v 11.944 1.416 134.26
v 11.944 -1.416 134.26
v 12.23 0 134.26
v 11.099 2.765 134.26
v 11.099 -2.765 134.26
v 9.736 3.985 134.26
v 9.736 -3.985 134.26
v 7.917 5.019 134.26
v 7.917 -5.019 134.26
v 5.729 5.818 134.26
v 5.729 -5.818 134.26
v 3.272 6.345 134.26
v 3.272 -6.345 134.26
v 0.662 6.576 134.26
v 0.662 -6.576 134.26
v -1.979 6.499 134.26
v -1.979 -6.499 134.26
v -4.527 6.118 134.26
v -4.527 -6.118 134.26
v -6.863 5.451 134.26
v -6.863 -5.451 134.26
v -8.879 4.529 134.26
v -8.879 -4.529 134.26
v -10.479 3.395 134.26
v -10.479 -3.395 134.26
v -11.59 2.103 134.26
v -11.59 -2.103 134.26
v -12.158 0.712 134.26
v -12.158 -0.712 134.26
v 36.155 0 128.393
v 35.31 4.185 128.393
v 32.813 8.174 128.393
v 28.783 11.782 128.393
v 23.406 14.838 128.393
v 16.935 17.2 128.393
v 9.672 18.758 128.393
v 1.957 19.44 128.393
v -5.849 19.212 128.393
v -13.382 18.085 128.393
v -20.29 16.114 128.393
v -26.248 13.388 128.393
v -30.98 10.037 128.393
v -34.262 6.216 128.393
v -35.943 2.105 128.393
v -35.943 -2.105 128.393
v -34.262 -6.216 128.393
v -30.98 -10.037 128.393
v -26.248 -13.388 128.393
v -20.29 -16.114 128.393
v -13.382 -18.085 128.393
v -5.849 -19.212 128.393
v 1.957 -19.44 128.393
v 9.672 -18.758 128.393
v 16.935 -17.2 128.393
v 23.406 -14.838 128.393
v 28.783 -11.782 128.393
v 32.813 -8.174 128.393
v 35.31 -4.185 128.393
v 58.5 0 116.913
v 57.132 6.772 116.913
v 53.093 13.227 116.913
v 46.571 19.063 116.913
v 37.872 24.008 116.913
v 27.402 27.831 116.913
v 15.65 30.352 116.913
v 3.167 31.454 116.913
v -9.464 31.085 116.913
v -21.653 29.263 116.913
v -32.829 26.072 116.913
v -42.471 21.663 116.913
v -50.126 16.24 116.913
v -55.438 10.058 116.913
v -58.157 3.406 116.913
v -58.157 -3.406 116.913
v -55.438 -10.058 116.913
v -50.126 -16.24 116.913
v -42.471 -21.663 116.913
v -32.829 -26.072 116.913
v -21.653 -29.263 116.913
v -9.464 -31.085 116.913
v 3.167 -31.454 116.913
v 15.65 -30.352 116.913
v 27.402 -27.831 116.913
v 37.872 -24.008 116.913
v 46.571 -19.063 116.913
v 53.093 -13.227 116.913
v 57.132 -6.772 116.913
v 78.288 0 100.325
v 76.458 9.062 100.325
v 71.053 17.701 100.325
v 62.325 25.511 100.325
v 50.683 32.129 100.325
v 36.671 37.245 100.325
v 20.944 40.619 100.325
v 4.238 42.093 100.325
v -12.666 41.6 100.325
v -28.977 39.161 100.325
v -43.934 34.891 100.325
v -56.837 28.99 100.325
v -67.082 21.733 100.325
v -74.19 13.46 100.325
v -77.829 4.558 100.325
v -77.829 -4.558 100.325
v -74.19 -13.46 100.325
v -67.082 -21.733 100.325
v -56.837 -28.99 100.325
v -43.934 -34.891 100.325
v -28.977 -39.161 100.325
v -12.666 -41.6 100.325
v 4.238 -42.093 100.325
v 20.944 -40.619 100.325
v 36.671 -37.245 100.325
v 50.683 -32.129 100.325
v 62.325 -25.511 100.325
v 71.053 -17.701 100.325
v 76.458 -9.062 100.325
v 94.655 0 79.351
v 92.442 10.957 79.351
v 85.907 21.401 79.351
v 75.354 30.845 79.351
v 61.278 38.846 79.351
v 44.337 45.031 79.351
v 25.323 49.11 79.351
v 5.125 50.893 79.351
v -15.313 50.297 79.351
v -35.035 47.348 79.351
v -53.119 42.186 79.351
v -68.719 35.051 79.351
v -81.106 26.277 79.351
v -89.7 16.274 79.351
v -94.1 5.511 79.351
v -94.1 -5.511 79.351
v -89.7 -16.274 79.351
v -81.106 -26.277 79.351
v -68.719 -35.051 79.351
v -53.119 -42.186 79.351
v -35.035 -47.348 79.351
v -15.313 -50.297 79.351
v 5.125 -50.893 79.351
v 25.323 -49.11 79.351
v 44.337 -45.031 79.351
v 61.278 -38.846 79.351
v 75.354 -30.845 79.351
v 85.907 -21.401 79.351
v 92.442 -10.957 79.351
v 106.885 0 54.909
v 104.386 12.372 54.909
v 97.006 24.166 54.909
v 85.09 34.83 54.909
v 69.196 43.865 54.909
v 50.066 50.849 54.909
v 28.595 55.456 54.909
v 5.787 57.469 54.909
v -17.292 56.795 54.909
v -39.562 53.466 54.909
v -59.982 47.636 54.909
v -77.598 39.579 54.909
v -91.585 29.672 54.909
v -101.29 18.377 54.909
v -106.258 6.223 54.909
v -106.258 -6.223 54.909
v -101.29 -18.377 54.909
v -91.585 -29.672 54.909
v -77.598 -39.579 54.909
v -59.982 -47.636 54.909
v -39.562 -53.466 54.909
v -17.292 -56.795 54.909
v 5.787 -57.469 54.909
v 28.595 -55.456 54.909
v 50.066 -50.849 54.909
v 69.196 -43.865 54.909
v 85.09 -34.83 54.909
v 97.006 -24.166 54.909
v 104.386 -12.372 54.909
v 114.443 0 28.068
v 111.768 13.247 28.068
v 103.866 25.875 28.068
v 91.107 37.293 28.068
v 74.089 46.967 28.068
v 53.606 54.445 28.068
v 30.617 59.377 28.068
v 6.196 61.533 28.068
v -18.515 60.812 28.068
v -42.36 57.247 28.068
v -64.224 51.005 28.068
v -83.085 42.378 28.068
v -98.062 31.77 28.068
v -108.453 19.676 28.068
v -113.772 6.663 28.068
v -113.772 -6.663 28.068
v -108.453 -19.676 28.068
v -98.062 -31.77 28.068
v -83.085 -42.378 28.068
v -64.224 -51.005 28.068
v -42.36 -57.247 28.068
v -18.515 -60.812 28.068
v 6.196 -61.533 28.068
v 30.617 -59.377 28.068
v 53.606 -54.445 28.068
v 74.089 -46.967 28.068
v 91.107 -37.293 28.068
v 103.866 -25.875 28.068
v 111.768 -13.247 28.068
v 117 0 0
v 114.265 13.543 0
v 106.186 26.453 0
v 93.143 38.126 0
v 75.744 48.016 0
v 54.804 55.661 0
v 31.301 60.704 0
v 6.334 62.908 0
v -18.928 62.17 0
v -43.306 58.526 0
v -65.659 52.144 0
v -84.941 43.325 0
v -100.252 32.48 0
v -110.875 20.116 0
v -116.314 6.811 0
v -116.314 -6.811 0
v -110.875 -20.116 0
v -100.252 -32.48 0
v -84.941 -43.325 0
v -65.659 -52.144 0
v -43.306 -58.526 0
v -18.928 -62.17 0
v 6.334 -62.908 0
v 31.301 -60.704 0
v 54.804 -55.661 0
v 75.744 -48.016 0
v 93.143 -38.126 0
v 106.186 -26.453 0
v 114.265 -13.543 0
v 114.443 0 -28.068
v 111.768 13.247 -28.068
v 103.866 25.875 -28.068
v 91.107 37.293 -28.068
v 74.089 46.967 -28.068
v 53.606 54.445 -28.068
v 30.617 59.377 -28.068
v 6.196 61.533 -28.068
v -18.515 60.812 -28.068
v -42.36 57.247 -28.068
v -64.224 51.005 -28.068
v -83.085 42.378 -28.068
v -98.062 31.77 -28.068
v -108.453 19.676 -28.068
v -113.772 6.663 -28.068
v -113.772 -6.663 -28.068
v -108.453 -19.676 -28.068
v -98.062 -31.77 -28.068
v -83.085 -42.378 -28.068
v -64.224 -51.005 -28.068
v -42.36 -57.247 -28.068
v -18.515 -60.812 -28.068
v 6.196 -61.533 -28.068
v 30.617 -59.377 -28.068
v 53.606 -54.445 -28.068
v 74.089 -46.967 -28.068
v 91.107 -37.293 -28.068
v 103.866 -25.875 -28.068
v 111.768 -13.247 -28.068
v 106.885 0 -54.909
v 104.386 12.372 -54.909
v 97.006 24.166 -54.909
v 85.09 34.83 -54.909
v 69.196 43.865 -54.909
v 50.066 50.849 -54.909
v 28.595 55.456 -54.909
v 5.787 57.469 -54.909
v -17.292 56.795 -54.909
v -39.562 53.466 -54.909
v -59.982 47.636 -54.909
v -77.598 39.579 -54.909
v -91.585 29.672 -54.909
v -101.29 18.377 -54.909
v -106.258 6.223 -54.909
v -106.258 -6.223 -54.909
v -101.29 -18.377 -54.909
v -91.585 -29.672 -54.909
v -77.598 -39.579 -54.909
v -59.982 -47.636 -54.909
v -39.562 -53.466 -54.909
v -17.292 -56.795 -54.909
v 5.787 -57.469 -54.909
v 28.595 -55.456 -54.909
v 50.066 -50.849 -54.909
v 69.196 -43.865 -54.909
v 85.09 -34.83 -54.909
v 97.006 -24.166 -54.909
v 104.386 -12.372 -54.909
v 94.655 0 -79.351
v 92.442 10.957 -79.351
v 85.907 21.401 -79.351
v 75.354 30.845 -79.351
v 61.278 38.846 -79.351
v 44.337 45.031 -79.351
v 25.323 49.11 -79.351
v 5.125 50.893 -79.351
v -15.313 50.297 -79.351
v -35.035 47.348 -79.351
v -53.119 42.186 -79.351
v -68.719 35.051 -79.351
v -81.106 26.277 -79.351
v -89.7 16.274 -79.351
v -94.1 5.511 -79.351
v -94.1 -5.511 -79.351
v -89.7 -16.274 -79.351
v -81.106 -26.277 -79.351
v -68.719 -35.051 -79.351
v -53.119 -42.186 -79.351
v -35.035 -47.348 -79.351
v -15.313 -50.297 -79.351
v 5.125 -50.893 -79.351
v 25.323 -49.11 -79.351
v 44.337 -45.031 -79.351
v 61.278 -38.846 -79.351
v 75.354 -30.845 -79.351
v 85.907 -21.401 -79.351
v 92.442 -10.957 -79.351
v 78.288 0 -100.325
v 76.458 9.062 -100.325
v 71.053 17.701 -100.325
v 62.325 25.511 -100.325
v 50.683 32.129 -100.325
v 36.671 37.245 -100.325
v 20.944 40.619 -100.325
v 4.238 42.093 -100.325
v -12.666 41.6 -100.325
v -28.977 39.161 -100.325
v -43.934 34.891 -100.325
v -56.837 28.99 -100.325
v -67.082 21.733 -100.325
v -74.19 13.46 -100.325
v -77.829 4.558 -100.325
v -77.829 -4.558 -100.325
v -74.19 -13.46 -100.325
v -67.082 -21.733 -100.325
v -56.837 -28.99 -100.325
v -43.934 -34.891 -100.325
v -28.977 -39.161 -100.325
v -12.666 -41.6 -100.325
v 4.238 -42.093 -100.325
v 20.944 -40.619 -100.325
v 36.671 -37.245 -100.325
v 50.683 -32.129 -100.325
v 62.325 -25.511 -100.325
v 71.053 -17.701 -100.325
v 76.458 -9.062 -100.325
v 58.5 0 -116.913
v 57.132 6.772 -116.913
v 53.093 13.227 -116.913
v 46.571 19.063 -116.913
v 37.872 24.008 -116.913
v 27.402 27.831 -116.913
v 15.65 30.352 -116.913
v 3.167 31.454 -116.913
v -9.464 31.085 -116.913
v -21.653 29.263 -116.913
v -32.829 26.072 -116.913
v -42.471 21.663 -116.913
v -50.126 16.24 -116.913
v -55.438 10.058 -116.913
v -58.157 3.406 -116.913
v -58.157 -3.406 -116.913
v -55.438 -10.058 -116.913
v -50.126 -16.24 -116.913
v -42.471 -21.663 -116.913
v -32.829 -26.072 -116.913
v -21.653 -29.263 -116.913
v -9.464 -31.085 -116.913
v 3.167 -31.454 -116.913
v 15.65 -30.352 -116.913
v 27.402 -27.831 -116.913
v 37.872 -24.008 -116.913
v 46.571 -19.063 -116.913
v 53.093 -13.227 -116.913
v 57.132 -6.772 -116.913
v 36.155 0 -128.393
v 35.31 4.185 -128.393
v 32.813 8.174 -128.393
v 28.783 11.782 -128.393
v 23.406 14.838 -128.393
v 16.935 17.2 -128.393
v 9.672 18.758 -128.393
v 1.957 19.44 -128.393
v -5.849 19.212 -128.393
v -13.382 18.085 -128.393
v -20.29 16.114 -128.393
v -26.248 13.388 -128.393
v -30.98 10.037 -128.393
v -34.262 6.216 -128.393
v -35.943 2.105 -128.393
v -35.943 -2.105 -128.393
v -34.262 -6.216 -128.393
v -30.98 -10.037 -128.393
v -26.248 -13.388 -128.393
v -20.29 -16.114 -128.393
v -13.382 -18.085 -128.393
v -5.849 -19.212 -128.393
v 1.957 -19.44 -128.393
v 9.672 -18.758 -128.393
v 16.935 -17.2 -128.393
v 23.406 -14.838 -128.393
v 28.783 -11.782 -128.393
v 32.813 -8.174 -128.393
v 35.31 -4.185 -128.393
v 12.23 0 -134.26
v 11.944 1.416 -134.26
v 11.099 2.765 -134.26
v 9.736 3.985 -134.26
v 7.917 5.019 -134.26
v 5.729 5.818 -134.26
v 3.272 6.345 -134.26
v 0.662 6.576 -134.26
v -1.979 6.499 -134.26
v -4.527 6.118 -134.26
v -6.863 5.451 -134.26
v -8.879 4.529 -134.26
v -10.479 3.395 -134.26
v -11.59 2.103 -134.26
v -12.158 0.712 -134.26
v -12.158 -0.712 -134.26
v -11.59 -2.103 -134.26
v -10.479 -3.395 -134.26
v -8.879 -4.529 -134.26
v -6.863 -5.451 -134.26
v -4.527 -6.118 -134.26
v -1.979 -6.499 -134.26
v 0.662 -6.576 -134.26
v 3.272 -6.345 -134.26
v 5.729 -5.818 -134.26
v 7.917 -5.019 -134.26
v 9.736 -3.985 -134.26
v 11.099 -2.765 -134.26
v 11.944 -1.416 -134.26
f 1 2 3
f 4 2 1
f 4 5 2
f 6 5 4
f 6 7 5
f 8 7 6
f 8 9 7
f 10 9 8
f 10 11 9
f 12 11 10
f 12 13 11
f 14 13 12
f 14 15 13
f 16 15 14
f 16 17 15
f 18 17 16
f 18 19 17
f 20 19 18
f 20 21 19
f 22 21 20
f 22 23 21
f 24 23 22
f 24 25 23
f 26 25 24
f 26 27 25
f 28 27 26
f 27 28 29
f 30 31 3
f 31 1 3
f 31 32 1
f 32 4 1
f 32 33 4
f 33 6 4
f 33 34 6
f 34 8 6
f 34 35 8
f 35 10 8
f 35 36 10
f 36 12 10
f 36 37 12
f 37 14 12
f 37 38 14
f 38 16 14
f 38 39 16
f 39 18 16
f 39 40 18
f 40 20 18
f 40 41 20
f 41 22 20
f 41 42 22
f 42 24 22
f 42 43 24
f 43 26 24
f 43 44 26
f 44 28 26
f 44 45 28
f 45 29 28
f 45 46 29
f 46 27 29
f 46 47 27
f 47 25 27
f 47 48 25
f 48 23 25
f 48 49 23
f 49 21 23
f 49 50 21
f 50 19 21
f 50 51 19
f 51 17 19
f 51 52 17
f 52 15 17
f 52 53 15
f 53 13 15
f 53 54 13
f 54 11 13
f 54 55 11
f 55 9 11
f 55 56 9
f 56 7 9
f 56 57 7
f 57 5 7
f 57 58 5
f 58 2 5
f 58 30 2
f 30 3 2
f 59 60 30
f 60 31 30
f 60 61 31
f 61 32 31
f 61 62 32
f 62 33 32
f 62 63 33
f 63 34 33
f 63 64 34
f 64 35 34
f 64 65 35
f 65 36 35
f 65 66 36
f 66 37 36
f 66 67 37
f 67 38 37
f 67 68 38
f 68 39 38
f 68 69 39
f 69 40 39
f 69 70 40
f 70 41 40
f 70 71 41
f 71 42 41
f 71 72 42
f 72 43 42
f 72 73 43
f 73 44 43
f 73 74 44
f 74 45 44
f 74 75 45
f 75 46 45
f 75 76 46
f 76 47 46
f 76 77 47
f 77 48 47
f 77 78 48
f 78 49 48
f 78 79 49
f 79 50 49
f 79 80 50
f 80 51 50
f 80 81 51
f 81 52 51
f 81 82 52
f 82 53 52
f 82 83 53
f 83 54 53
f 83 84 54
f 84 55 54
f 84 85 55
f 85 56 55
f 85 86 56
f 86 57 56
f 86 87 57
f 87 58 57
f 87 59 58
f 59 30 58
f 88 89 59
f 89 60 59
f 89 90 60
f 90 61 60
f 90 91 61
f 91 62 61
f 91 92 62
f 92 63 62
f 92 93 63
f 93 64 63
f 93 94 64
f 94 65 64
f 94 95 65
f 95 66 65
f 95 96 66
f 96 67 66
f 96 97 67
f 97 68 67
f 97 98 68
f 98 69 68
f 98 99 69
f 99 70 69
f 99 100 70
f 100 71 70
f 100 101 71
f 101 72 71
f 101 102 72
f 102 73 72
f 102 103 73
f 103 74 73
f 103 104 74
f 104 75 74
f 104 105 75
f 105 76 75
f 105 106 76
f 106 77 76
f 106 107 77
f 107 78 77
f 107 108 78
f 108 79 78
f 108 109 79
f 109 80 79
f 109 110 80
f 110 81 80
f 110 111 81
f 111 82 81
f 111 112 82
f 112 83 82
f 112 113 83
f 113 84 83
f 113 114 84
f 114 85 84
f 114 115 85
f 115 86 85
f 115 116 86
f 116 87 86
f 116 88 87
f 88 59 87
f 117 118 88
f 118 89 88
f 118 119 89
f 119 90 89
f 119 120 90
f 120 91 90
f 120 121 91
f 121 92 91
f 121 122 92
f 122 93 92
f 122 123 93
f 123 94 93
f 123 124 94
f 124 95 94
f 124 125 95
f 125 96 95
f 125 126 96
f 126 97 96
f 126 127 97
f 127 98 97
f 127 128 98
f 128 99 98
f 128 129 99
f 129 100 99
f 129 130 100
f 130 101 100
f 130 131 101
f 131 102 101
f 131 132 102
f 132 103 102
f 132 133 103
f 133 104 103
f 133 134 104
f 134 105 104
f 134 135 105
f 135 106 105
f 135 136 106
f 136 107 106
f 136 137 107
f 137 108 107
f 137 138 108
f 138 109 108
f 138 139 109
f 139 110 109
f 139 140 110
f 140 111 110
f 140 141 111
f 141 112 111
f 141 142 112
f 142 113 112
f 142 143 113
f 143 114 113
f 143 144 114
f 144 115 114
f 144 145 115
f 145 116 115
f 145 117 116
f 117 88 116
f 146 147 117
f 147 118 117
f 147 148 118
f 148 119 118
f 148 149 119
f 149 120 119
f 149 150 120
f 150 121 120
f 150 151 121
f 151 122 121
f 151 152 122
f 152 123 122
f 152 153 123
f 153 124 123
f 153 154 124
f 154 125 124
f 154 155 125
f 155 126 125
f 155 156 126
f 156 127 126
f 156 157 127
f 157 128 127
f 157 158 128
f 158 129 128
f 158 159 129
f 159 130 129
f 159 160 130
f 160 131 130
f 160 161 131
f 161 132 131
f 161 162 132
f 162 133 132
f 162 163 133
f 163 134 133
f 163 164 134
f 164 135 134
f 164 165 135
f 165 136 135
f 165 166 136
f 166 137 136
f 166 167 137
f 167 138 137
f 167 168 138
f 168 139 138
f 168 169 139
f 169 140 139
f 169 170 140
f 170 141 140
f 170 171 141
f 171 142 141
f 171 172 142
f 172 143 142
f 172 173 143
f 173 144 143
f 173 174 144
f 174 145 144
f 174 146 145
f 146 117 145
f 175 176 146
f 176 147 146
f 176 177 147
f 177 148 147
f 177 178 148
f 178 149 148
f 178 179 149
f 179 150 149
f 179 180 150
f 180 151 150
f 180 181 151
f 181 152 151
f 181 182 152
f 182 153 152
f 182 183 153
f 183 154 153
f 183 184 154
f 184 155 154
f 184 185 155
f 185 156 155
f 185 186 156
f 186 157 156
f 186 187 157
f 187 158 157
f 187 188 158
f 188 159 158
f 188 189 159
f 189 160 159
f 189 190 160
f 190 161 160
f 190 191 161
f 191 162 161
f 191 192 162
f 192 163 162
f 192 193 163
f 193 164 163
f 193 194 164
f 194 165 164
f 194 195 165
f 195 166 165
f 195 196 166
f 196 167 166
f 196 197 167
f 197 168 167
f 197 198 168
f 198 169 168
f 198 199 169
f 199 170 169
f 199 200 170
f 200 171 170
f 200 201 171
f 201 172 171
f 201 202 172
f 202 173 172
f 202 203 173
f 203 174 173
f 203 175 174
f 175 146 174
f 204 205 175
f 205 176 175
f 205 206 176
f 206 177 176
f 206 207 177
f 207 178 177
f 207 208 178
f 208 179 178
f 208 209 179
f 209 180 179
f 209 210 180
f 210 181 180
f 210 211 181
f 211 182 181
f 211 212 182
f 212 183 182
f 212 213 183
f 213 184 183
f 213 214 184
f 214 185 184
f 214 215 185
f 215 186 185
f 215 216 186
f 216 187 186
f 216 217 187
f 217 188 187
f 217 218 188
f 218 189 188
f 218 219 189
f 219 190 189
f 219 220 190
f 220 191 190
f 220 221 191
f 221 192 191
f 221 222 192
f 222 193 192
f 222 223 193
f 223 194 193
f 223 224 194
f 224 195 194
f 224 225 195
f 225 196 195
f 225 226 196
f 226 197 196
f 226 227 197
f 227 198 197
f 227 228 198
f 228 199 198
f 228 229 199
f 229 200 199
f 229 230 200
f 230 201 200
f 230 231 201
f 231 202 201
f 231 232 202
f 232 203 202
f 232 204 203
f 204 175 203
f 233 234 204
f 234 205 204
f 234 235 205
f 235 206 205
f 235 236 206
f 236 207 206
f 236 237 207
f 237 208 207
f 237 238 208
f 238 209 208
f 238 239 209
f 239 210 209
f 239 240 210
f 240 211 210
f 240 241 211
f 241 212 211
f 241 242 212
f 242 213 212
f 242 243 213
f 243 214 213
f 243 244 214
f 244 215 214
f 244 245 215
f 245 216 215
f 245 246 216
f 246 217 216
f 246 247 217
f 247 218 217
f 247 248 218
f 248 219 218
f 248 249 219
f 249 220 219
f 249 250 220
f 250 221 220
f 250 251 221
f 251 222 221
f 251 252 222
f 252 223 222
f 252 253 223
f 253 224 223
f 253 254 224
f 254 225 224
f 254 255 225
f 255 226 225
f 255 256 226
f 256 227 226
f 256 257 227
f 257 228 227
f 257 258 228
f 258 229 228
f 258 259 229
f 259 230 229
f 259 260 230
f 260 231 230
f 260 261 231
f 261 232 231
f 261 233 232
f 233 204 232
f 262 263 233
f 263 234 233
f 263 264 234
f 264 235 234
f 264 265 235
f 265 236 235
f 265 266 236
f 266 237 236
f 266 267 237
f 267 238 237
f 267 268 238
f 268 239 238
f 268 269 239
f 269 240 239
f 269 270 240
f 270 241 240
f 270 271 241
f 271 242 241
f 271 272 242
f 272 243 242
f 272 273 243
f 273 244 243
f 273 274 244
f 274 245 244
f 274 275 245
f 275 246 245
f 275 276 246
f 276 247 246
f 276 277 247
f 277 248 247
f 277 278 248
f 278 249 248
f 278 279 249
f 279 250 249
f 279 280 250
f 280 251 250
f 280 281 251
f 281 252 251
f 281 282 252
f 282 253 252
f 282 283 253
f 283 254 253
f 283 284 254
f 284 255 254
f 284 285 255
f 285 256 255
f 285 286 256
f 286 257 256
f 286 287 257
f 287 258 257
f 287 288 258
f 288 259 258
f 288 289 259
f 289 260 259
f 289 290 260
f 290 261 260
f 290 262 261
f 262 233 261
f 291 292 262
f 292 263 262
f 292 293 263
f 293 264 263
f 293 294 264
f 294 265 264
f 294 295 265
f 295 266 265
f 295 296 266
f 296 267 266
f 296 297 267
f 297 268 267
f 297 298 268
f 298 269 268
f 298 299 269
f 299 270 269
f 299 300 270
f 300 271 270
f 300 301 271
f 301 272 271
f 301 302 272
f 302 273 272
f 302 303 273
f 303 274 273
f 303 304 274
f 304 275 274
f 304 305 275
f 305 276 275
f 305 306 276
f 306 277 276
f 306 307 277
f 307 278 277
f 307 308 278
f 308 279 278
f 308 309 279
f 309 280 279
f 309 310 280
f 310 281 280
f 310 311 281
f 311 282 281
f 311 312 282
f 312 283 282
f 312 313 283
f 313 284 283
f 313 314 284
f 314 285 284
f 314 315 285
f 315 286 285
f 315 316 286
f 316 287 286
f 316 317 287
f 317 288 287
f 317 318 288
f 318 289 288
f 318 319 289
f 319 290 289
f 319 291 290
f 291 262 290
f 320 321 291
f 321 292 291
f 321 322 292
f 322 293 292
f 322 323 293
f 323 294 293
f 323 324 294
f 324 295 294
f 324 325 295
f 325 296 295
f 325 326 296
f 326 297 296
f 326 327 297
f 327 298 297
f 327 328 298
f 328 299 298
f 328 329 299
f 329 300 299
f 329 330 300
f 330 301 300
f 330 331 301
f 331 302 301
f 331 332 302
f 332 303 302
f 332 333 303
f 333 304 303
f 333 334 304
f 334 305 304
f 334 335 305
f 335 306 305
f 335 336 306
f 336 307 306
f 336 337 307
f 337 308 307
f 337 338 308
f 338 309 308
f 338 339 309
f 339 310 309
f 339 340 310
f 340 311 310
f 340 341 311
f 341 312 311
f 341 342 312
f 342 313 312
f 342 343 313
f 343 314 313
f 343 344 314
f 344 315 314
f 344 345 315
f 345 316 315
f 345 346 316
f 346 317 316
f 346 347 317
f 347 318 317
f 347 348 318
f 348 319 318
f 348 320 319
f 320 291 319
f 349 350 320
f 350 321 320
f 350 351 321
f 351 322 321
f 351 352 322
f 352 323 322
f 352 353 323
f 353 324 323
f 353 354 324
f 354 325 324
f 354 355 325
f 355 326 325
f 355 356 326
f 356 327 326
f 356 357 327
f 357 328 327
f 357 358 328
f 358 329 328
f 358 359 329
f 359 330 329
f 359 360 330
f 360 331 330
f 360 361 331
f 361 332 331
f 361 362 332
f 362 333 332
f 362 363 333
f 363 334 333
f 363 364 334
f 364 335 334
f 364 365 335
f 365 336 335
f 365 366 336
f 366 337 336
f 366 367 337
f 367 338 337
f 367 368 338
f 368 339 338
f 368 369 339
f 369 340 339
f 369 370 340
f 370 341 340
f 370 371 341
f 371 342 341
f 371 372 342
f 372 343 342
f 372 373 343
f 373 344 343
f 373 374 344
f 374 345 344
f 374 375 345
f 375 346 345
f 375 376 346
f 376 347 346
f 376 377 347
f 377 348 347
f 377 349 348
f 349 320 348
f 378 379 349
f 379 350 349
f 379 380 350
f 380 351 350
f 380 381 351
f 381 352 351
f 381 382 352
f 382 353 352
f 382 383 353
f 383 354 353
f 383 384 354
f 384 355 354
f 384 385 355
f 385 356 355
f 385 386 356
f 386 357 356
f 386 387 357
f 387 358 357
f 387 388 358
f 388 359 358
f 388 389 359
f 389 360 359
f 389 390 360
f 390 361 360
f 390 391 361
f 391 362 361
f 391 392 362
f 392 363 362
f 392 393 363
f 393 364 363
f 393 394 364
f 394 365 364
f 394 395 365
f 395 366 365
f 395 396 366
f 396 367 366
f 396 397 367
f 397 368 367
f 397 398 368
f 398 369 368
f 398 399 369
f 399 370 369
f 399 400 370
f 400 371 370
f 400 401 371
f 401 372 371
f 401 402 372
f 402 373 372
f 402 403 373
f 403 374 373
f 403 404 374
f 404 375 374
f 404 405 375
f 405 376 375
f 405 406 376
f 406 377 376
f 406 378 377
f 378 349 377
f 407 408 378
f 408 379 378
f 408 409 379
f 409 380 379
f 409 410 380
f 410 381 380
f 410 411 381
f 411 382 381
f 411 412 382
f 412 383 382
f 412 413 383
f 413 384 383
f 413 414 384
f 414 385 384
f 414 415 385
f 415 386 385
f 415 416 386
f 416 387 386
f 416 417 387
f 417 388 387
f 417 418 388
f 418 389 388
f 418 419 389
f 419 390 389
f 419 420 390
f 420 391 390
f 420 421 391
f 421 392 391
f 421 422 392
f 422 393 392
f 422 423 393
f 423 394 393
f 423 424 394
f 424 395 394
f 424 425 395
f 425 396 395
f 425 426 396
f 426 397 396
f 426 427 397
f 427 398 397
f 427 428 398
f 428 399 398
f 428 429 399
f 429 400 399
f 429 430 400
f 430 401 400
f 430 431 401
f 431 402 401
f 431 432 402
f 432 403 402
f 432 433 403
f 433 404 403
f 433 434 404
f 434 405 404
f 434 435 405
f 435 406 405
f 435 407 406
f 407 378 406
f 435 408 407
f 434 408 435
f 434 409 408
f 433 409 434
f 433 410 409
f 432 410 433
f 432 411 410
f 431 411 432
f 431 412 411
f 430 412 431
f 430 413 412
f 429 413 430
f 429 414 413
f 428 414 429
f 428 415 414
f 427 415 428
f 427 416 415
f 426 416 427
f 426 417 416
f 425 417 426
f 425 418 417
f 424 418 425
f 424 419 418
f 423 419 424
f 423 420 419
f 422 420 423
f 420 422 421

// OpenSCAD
// Generated by SolidPython 1.0.1 on 2020-07-29 00:46:50


scale(v = [13, 7, 15]) {
	sphere(r = 9);
}
/***********************************************
*********      SolidPython code:      **********
************************************************
 
# import packages: SolidPython
from solid import *
from solid.utils import *
from itertools import chain, combinations, permutations


class Resize:

    def __init__(self, scad_file):
        self.scad_file = scad_file
        #self.scad_file = import_scad(scad_file)
        # cone/cylinder param:
        self.r1 = 0
        self.r2 = 0
        self.h = 0
        # rectangular prism param:
        self.w = 0
        self.l = 0
        # ellipse param:
        self.r = 0

    # import OpenScad code (file name corresponds to shape)


    # classify shape + parameters
    def assign(self, param1, param2, param3):
        if self.scad_file == 'cone.scad':
            self.r1 = param1
            self.r2 = param2
            self.h = param3
        elif self.scad_file == 'cylinder.scad':
            self.r1 = param1
            self.r2 = param2
            self.h = param3
        elif self.scad_file == 'rectangularPrism.scad':
            self.h = param1
            self.l = param2
            self.w = param3
        else:
            self.r = param1
            self.h = param2

    # resize parameters
    def iterate(self):
        x = range(3, 20, 2)
        i = 1
        if self.scad_file == 'cone.scad':
            tempList = list(permutations(x, 2))
            for temp in tempList:
                param1 = temp[0]
                param2 = temp[1]
                filepath = 'produced_scad_files/' + 'cone' + str(param1) + '_' + str(param2) + '_' + '.scad'
                scad_render_to_file(cylinder(h=param1, r1=param2, r2=0), filepath)

        elif self.scad_file == 'cylinder.scad':
            tempList = list(permutations(x, 3))
            for temp in tempList:
                param1 = temp[0]
                param2 = temp[1]
                filepath = 'produced_scad_files/' + 'cylinder' + str(param1) + '_' + str(param2) + '_' + '.scad'
                scad_render_to_file(cylinder(h=param1, r1=param2, r2=param2), filepath)

        elif self.scad_file == 'rectangularPrism.scad':
            tempList = list(permutations(x, 3))
            for temp in tempList:
                param1 = temp[0]
                param2 = temp[1]
                param3 = temp[2]
                filepath = 'produced_scad_files/' + 'rectangularPrism' + str(param1) + '_' + str(param2) + '_' + str(
                    param3) + '.scad'
                scad_render_to_file(cube(size=(param1, param2, param3)), filepath)

        elif self.scad_file == 'ellipse.scad':
            tempList = list(permutations(x, 4))
            for temp in tempList:
                param1 = temp[0]
                param2 = temp[1]
                param3 = temp[2]
                param4 = temp[3]
                filepath = 'produced_scad_files/' + 'ellipse' + str(param1) + '_' + str(param2) + '_' + str(param3) + '_' + str(param4) + '.scad'
                scad_render_to_file(scale([param1, param2, param3])(sphere(r=param4)), filepath)

    def render_to_scadfile(self):
        scad_render_to_file(scad, 'example.scad') 
 
************************************************/
